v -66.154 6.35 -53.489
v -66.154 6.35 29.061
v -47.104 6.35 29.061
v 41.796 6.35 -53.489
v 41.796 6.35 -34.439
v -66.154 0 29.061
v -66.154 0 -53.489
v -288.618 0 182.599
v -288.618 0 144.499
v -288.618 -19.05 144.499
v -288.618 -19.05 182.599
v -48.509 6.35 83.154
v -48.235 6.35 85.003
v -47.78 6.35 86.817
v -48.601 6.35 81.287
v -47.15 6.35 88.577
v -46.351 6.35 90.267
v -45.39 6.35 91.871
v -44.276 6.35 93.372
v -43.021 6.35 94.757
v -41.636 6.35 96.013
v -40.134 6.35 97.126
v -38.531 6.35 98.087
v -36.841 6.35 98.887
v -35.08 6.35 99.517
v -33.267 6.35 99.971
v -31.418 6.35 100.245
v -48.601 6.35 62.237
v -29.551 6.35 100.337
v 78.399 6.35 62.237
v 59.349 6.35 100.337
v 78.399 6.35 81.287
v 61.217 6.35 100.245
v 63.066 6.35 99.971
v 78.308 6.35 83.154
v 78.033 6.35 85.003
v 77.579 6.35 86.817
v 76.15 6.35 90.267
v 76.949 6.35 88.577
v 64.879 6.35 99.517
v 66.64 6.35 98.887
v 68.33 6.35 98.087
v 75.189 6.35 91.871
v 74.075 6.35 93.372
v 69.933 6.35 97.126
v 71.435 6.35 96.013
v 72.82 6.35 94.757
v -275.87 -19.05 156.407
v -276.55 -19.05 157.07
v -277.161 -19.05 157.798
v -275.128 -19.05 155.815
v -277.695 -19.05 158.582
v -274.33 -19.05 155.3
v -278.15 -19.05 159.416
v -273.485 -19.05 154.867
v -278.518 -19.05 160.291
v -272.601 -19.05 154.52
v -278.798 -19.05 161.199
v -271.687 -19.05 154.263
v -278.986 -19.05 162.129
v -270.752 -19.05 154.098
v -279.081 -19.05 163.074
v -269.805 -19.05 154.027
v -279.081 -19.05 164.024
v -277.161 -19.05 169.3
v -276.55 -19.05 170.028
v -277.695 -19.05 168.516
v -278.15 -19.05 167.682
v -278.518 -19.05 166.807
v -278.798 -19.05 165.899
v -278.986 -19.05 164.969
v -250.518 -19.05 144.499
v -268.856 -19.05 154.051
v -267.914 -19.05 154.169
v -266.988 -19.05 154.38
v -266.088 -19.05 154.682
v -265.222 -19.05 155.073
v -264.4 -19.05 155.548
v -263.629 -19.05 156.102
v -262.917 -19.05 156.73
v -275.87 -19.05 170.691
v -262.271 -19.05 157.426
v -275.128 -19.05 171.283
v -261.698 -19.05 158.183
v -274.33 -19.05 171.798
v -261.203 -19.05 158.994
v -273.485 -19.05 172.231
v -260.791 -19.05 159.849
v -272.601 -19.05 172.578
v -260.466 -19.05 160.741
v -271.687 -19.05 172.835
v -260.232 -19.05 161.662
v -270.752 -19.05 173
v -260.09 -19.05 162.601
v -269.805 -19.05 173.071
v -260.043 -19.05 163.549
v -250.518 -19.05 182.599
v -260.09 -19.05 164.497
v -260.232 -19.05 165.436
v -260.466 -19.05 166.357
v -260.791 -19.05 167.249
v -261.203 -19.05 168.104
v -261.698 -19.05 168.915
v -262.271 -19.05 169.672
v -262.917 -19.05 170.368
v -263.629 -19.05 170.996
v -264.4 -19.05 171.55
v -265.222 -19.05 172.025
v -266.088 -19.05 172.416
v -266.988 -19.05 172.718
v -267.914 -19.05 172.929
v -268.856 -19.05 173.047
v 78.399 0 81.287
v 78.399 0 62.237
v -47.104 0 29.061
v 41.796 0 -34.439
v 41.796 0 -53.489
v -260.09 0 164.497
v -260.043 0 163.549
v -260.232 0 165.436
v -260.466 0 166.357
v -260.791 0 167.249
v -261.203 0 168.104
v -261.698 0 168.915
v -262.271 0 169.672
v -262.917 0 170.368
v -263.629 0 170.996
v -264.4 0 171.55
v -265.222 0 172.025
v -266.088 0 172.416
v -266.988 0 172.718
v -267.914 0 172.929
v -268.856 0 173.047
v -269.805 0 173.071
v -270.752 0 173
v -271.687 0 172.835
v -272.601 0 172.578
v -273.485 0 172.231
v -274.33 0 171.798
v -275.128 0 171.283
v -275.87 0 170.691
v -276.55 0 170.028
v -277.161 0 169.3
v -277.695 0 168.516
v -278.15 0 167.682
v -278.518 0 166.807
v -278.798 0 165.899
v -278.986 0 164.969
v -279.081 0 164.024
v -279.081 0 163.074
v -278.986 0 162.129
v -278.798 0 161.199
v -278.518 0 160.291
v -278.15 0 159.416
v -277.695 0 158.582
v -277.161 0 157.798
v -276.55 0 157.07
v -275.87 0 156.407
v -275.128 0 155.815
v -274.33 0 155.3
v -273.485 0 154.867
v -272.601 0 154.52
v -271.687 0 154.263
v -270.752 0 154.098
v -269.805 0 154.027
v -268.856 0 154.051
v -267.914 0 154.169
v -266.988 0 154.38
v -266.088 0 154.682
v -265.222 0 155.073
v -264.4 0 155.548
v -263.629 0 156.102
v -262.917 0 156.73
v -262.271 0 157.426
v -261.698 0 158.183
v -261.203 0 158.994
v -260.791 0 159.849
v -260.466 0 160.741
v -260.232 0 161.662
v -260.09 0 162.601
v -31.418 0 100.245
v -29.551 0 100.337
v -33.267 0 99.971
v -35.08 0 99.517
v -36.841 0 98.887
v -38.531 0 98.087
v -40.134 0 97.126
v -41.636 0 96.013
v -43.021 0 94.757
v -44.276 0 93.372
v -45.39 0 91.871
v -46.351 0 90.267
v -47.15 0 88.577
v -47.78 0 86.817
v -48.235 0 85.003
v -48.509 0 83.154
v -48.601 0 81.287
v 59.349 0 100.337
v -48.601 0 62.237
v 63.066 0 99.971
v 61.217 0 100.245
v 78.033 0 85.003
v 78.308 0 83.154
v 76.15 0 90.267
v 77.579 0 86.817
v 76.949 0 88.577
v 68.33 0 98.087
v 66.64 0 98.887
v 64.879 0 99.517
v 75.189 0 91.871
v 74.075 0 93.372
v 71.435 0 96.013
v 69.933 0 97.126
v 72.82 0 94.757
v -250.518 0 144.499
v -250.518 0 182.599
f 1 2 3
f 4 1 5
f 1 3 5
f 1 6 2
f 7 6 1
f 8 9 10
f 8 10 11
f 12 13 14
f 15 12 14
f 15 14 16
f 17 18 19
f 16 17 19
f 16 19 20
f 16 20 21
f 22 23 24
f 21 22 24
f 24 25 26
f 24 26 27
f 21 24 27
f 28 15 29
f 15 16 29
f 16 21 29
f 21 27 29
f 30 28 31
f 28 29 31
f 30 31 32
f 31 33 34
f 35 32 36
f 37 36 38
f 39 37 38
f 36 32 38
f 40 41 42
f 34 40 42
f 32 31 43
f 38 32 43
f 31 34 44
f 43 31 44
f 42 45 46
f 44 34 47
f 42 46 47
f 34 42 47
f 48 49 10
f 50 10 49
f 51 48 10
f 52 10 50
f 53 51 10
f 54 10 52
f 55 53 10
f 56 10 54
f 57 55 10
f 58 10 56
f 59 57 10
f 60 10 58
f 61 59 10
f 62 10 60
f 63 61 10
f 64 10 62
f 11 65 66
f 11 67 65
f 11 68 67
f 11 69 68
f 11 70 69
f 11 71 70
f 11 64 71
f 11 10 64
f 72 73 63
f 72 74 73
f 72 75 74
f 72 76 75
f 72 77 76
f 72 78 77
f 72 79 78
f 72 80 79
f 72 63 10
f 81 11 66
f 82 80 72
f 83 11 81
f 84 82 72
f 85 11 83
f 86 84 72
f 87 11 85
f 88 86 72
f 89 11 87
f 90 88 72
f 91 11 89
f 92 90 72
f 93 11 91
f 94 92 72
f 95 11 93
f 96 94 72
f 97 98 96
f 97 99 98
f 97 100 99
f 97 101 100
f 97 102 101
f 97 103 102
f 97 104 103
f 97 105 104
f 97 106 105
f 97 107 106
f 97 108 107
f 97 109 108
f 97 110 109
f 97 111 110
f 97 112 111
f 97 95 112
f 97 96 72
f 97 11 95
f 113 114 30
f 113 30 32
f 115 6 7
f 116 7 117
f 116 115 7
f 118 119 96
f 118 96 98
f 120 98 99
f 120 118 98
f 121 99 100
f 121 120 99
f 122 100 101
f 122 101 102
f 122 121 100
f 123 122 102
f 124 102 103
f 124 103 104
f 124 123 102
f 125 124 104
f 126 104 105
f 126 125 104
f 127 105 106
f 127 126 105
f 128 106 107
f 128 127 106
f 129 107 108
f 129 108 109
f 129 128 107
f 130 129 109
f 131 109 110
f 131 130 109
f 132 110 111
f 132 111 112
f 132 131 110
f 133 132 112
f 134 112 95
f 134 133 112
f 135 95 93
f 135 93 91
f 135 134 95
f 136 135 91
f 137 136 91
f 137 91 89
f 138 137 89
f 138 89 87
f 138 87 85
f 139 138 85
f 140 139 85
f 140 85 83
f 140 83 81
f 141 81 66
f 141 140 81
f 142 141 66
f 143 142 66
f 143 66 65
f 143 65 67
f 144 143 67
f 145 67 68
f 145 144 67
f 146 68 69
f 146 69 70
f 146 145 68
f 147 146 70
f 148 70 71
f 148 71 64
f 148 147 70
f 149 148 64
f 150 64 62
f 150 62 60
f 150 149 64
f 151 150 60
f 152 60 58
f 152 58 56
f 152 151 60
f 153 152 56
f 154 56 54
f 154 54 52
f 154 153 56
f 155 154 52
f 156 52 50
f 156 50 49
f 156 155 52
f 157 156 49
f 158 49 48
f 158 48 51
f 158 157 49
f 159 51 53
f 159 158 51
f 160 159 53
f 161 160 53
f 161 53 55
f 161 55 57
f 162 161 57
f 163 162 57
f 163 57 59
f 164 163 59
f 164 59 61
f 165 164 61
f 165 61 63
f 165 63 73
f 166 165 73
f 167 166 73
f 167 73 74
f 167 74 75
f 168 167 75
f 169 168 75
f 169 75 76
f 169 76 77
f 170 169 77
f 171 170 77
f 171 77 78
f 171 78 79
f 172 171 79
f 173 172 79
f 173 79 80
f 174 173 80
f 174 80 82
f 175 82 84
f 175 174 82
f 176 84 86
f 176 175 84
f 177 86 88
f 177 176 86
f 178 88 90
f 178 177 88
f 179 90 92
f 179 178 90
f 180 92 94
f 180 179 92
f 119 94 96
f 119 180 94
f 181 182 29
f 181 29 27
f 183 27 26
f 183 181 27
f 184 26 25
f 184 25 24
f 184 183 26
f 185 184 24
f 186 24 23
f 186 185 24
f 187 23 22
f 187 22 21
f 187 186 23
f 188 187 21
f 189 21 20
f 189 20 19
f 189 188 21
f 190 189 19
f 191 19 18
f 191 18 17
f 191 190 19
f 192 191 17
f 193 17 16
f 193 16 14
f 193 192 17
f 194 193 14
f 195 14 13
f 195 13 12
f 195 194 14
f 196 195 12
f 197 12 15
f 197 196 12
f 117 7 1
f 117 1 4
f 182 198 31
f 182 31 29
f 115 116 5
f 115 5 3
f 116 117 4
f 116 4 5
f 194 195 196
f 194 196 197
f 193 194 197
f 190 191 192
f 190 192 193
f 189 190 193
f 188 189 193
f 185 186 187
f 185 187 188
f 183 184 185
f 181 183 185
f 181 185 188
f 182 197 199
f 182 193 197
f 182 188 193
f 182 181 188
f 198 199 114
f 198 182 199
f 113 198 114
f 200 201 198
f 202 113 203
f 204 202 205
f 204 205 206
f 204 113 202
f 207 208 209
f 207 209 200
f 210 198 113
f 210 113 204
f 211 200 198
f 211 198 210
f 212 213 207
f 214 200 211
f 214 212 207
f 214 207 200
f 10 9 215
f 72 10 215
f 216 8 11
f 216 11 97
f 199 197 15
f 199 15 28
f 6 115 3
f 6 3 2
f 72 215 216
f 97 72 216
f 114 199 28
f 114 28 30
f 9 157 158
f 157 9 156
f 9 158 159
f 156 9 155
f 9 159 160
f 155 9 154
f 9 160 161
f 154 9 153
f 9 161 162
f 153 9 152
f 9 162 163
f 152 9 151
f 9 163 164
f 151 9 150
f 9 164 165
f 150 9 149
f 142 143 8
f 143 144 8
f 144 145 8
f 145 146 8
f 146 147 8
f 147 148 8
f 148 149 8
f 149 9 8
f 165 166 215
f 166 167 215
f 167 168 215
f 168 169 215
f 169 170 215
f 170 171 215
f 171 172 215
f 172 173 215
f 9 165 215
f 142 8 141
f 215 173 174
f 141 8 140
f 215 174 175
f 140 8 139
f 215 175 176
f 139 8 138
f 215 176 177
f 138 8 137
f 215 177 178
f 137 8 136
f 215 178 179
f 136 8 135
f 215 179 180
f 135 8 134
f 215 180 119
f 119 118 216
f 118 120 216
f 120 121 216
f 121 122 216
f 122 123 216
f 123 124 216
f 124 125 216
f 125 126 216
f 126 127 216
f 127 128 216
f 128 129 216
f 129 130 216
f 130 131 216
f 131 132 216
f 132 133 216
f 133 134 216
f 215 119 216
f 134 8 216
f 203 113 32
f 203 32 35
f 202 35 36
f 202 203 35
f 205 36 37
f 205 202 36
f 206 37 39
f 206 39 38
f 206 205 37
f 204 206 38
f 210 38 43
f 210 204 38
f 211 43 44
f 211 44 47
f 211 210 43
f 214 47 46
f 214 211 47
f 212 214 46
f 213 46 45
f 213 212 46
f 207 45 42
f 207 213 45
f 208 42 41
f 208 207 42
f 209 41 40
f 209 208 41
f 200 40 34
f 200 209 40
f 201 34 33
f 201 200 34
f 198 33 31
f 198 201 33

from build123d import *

# Parameters (mm, degrees)
F1_DEPTH = 6.35
F3_DEPTH = 6.35
F4_W     = 285.75
F4_H     = 258.96094
F5_DEPTH = 19.05
F6_W     = 38.1
F6_H     = 38.1
F6_R     = 9.525
F7_DEPTH = 19.05


with BuildPart() as f1:
    # F0 (on Front) → F1 (new body)
    with BuildSketch(Plane.XZ):
        Polygon((41.796481, -34.438996), (-47.103519, 29.061004), (-66.153519, 29.061004), (-66.153519, -53.488996), (41.796481, -53.488996), align=None)
    extrude(amount=-F1_DEPTH)


with BuildPart() as f3:
    # F2 (on Front) → F3 (new body)
    with BuildSketch(Plane.XZ):
        with BuildLine():
            Line((-48.600562, 62.236899), (78.399438, 62.236899))
            Line((78.399438, 62.236899), (78.399438, 81.286899))
            ThreePointArc((78.399438, 81.286899), (72.819822, 94.757283), (59.349438, 100.336899))
            Line((59.349438, 100.336899), (-29.550562, 100.336899))
            ThreePointArc((-29.550562, 100.336899), (-43.020946, 94.757283), (-48.600562, 81.286899))
            Line((-48.600562, 81.286899), (-48.600562, 62.236899))
        make_face()
    extrude(amount=-F3_DEPTH)


with BuildPart() as f5:
    # F4 (on Front) → F5 (new body)
    with BuildSketch(Plane.XZ):
        with Locations((-484.189391, 56.096062)):
            Rectangle(F4_W, F4_H)
    extrude(amount=F5_DEPTH)


with BuildPart() as f7:
    # F6 (on Front) → F7 (new body)
    with BuildSketch(Plane.XZ):
        with Locations((-269.567877, 163.548995)):
            Rectangle(F6_W, F6_H)
        with Locations((-269.567877, 163.548995)):
            Circle(F6_R, mode=Mode.SUBTRACT)
    extrude(amount=F7_DEPTH)


solid = Compound([f1.part, f3.part, f7.part])
